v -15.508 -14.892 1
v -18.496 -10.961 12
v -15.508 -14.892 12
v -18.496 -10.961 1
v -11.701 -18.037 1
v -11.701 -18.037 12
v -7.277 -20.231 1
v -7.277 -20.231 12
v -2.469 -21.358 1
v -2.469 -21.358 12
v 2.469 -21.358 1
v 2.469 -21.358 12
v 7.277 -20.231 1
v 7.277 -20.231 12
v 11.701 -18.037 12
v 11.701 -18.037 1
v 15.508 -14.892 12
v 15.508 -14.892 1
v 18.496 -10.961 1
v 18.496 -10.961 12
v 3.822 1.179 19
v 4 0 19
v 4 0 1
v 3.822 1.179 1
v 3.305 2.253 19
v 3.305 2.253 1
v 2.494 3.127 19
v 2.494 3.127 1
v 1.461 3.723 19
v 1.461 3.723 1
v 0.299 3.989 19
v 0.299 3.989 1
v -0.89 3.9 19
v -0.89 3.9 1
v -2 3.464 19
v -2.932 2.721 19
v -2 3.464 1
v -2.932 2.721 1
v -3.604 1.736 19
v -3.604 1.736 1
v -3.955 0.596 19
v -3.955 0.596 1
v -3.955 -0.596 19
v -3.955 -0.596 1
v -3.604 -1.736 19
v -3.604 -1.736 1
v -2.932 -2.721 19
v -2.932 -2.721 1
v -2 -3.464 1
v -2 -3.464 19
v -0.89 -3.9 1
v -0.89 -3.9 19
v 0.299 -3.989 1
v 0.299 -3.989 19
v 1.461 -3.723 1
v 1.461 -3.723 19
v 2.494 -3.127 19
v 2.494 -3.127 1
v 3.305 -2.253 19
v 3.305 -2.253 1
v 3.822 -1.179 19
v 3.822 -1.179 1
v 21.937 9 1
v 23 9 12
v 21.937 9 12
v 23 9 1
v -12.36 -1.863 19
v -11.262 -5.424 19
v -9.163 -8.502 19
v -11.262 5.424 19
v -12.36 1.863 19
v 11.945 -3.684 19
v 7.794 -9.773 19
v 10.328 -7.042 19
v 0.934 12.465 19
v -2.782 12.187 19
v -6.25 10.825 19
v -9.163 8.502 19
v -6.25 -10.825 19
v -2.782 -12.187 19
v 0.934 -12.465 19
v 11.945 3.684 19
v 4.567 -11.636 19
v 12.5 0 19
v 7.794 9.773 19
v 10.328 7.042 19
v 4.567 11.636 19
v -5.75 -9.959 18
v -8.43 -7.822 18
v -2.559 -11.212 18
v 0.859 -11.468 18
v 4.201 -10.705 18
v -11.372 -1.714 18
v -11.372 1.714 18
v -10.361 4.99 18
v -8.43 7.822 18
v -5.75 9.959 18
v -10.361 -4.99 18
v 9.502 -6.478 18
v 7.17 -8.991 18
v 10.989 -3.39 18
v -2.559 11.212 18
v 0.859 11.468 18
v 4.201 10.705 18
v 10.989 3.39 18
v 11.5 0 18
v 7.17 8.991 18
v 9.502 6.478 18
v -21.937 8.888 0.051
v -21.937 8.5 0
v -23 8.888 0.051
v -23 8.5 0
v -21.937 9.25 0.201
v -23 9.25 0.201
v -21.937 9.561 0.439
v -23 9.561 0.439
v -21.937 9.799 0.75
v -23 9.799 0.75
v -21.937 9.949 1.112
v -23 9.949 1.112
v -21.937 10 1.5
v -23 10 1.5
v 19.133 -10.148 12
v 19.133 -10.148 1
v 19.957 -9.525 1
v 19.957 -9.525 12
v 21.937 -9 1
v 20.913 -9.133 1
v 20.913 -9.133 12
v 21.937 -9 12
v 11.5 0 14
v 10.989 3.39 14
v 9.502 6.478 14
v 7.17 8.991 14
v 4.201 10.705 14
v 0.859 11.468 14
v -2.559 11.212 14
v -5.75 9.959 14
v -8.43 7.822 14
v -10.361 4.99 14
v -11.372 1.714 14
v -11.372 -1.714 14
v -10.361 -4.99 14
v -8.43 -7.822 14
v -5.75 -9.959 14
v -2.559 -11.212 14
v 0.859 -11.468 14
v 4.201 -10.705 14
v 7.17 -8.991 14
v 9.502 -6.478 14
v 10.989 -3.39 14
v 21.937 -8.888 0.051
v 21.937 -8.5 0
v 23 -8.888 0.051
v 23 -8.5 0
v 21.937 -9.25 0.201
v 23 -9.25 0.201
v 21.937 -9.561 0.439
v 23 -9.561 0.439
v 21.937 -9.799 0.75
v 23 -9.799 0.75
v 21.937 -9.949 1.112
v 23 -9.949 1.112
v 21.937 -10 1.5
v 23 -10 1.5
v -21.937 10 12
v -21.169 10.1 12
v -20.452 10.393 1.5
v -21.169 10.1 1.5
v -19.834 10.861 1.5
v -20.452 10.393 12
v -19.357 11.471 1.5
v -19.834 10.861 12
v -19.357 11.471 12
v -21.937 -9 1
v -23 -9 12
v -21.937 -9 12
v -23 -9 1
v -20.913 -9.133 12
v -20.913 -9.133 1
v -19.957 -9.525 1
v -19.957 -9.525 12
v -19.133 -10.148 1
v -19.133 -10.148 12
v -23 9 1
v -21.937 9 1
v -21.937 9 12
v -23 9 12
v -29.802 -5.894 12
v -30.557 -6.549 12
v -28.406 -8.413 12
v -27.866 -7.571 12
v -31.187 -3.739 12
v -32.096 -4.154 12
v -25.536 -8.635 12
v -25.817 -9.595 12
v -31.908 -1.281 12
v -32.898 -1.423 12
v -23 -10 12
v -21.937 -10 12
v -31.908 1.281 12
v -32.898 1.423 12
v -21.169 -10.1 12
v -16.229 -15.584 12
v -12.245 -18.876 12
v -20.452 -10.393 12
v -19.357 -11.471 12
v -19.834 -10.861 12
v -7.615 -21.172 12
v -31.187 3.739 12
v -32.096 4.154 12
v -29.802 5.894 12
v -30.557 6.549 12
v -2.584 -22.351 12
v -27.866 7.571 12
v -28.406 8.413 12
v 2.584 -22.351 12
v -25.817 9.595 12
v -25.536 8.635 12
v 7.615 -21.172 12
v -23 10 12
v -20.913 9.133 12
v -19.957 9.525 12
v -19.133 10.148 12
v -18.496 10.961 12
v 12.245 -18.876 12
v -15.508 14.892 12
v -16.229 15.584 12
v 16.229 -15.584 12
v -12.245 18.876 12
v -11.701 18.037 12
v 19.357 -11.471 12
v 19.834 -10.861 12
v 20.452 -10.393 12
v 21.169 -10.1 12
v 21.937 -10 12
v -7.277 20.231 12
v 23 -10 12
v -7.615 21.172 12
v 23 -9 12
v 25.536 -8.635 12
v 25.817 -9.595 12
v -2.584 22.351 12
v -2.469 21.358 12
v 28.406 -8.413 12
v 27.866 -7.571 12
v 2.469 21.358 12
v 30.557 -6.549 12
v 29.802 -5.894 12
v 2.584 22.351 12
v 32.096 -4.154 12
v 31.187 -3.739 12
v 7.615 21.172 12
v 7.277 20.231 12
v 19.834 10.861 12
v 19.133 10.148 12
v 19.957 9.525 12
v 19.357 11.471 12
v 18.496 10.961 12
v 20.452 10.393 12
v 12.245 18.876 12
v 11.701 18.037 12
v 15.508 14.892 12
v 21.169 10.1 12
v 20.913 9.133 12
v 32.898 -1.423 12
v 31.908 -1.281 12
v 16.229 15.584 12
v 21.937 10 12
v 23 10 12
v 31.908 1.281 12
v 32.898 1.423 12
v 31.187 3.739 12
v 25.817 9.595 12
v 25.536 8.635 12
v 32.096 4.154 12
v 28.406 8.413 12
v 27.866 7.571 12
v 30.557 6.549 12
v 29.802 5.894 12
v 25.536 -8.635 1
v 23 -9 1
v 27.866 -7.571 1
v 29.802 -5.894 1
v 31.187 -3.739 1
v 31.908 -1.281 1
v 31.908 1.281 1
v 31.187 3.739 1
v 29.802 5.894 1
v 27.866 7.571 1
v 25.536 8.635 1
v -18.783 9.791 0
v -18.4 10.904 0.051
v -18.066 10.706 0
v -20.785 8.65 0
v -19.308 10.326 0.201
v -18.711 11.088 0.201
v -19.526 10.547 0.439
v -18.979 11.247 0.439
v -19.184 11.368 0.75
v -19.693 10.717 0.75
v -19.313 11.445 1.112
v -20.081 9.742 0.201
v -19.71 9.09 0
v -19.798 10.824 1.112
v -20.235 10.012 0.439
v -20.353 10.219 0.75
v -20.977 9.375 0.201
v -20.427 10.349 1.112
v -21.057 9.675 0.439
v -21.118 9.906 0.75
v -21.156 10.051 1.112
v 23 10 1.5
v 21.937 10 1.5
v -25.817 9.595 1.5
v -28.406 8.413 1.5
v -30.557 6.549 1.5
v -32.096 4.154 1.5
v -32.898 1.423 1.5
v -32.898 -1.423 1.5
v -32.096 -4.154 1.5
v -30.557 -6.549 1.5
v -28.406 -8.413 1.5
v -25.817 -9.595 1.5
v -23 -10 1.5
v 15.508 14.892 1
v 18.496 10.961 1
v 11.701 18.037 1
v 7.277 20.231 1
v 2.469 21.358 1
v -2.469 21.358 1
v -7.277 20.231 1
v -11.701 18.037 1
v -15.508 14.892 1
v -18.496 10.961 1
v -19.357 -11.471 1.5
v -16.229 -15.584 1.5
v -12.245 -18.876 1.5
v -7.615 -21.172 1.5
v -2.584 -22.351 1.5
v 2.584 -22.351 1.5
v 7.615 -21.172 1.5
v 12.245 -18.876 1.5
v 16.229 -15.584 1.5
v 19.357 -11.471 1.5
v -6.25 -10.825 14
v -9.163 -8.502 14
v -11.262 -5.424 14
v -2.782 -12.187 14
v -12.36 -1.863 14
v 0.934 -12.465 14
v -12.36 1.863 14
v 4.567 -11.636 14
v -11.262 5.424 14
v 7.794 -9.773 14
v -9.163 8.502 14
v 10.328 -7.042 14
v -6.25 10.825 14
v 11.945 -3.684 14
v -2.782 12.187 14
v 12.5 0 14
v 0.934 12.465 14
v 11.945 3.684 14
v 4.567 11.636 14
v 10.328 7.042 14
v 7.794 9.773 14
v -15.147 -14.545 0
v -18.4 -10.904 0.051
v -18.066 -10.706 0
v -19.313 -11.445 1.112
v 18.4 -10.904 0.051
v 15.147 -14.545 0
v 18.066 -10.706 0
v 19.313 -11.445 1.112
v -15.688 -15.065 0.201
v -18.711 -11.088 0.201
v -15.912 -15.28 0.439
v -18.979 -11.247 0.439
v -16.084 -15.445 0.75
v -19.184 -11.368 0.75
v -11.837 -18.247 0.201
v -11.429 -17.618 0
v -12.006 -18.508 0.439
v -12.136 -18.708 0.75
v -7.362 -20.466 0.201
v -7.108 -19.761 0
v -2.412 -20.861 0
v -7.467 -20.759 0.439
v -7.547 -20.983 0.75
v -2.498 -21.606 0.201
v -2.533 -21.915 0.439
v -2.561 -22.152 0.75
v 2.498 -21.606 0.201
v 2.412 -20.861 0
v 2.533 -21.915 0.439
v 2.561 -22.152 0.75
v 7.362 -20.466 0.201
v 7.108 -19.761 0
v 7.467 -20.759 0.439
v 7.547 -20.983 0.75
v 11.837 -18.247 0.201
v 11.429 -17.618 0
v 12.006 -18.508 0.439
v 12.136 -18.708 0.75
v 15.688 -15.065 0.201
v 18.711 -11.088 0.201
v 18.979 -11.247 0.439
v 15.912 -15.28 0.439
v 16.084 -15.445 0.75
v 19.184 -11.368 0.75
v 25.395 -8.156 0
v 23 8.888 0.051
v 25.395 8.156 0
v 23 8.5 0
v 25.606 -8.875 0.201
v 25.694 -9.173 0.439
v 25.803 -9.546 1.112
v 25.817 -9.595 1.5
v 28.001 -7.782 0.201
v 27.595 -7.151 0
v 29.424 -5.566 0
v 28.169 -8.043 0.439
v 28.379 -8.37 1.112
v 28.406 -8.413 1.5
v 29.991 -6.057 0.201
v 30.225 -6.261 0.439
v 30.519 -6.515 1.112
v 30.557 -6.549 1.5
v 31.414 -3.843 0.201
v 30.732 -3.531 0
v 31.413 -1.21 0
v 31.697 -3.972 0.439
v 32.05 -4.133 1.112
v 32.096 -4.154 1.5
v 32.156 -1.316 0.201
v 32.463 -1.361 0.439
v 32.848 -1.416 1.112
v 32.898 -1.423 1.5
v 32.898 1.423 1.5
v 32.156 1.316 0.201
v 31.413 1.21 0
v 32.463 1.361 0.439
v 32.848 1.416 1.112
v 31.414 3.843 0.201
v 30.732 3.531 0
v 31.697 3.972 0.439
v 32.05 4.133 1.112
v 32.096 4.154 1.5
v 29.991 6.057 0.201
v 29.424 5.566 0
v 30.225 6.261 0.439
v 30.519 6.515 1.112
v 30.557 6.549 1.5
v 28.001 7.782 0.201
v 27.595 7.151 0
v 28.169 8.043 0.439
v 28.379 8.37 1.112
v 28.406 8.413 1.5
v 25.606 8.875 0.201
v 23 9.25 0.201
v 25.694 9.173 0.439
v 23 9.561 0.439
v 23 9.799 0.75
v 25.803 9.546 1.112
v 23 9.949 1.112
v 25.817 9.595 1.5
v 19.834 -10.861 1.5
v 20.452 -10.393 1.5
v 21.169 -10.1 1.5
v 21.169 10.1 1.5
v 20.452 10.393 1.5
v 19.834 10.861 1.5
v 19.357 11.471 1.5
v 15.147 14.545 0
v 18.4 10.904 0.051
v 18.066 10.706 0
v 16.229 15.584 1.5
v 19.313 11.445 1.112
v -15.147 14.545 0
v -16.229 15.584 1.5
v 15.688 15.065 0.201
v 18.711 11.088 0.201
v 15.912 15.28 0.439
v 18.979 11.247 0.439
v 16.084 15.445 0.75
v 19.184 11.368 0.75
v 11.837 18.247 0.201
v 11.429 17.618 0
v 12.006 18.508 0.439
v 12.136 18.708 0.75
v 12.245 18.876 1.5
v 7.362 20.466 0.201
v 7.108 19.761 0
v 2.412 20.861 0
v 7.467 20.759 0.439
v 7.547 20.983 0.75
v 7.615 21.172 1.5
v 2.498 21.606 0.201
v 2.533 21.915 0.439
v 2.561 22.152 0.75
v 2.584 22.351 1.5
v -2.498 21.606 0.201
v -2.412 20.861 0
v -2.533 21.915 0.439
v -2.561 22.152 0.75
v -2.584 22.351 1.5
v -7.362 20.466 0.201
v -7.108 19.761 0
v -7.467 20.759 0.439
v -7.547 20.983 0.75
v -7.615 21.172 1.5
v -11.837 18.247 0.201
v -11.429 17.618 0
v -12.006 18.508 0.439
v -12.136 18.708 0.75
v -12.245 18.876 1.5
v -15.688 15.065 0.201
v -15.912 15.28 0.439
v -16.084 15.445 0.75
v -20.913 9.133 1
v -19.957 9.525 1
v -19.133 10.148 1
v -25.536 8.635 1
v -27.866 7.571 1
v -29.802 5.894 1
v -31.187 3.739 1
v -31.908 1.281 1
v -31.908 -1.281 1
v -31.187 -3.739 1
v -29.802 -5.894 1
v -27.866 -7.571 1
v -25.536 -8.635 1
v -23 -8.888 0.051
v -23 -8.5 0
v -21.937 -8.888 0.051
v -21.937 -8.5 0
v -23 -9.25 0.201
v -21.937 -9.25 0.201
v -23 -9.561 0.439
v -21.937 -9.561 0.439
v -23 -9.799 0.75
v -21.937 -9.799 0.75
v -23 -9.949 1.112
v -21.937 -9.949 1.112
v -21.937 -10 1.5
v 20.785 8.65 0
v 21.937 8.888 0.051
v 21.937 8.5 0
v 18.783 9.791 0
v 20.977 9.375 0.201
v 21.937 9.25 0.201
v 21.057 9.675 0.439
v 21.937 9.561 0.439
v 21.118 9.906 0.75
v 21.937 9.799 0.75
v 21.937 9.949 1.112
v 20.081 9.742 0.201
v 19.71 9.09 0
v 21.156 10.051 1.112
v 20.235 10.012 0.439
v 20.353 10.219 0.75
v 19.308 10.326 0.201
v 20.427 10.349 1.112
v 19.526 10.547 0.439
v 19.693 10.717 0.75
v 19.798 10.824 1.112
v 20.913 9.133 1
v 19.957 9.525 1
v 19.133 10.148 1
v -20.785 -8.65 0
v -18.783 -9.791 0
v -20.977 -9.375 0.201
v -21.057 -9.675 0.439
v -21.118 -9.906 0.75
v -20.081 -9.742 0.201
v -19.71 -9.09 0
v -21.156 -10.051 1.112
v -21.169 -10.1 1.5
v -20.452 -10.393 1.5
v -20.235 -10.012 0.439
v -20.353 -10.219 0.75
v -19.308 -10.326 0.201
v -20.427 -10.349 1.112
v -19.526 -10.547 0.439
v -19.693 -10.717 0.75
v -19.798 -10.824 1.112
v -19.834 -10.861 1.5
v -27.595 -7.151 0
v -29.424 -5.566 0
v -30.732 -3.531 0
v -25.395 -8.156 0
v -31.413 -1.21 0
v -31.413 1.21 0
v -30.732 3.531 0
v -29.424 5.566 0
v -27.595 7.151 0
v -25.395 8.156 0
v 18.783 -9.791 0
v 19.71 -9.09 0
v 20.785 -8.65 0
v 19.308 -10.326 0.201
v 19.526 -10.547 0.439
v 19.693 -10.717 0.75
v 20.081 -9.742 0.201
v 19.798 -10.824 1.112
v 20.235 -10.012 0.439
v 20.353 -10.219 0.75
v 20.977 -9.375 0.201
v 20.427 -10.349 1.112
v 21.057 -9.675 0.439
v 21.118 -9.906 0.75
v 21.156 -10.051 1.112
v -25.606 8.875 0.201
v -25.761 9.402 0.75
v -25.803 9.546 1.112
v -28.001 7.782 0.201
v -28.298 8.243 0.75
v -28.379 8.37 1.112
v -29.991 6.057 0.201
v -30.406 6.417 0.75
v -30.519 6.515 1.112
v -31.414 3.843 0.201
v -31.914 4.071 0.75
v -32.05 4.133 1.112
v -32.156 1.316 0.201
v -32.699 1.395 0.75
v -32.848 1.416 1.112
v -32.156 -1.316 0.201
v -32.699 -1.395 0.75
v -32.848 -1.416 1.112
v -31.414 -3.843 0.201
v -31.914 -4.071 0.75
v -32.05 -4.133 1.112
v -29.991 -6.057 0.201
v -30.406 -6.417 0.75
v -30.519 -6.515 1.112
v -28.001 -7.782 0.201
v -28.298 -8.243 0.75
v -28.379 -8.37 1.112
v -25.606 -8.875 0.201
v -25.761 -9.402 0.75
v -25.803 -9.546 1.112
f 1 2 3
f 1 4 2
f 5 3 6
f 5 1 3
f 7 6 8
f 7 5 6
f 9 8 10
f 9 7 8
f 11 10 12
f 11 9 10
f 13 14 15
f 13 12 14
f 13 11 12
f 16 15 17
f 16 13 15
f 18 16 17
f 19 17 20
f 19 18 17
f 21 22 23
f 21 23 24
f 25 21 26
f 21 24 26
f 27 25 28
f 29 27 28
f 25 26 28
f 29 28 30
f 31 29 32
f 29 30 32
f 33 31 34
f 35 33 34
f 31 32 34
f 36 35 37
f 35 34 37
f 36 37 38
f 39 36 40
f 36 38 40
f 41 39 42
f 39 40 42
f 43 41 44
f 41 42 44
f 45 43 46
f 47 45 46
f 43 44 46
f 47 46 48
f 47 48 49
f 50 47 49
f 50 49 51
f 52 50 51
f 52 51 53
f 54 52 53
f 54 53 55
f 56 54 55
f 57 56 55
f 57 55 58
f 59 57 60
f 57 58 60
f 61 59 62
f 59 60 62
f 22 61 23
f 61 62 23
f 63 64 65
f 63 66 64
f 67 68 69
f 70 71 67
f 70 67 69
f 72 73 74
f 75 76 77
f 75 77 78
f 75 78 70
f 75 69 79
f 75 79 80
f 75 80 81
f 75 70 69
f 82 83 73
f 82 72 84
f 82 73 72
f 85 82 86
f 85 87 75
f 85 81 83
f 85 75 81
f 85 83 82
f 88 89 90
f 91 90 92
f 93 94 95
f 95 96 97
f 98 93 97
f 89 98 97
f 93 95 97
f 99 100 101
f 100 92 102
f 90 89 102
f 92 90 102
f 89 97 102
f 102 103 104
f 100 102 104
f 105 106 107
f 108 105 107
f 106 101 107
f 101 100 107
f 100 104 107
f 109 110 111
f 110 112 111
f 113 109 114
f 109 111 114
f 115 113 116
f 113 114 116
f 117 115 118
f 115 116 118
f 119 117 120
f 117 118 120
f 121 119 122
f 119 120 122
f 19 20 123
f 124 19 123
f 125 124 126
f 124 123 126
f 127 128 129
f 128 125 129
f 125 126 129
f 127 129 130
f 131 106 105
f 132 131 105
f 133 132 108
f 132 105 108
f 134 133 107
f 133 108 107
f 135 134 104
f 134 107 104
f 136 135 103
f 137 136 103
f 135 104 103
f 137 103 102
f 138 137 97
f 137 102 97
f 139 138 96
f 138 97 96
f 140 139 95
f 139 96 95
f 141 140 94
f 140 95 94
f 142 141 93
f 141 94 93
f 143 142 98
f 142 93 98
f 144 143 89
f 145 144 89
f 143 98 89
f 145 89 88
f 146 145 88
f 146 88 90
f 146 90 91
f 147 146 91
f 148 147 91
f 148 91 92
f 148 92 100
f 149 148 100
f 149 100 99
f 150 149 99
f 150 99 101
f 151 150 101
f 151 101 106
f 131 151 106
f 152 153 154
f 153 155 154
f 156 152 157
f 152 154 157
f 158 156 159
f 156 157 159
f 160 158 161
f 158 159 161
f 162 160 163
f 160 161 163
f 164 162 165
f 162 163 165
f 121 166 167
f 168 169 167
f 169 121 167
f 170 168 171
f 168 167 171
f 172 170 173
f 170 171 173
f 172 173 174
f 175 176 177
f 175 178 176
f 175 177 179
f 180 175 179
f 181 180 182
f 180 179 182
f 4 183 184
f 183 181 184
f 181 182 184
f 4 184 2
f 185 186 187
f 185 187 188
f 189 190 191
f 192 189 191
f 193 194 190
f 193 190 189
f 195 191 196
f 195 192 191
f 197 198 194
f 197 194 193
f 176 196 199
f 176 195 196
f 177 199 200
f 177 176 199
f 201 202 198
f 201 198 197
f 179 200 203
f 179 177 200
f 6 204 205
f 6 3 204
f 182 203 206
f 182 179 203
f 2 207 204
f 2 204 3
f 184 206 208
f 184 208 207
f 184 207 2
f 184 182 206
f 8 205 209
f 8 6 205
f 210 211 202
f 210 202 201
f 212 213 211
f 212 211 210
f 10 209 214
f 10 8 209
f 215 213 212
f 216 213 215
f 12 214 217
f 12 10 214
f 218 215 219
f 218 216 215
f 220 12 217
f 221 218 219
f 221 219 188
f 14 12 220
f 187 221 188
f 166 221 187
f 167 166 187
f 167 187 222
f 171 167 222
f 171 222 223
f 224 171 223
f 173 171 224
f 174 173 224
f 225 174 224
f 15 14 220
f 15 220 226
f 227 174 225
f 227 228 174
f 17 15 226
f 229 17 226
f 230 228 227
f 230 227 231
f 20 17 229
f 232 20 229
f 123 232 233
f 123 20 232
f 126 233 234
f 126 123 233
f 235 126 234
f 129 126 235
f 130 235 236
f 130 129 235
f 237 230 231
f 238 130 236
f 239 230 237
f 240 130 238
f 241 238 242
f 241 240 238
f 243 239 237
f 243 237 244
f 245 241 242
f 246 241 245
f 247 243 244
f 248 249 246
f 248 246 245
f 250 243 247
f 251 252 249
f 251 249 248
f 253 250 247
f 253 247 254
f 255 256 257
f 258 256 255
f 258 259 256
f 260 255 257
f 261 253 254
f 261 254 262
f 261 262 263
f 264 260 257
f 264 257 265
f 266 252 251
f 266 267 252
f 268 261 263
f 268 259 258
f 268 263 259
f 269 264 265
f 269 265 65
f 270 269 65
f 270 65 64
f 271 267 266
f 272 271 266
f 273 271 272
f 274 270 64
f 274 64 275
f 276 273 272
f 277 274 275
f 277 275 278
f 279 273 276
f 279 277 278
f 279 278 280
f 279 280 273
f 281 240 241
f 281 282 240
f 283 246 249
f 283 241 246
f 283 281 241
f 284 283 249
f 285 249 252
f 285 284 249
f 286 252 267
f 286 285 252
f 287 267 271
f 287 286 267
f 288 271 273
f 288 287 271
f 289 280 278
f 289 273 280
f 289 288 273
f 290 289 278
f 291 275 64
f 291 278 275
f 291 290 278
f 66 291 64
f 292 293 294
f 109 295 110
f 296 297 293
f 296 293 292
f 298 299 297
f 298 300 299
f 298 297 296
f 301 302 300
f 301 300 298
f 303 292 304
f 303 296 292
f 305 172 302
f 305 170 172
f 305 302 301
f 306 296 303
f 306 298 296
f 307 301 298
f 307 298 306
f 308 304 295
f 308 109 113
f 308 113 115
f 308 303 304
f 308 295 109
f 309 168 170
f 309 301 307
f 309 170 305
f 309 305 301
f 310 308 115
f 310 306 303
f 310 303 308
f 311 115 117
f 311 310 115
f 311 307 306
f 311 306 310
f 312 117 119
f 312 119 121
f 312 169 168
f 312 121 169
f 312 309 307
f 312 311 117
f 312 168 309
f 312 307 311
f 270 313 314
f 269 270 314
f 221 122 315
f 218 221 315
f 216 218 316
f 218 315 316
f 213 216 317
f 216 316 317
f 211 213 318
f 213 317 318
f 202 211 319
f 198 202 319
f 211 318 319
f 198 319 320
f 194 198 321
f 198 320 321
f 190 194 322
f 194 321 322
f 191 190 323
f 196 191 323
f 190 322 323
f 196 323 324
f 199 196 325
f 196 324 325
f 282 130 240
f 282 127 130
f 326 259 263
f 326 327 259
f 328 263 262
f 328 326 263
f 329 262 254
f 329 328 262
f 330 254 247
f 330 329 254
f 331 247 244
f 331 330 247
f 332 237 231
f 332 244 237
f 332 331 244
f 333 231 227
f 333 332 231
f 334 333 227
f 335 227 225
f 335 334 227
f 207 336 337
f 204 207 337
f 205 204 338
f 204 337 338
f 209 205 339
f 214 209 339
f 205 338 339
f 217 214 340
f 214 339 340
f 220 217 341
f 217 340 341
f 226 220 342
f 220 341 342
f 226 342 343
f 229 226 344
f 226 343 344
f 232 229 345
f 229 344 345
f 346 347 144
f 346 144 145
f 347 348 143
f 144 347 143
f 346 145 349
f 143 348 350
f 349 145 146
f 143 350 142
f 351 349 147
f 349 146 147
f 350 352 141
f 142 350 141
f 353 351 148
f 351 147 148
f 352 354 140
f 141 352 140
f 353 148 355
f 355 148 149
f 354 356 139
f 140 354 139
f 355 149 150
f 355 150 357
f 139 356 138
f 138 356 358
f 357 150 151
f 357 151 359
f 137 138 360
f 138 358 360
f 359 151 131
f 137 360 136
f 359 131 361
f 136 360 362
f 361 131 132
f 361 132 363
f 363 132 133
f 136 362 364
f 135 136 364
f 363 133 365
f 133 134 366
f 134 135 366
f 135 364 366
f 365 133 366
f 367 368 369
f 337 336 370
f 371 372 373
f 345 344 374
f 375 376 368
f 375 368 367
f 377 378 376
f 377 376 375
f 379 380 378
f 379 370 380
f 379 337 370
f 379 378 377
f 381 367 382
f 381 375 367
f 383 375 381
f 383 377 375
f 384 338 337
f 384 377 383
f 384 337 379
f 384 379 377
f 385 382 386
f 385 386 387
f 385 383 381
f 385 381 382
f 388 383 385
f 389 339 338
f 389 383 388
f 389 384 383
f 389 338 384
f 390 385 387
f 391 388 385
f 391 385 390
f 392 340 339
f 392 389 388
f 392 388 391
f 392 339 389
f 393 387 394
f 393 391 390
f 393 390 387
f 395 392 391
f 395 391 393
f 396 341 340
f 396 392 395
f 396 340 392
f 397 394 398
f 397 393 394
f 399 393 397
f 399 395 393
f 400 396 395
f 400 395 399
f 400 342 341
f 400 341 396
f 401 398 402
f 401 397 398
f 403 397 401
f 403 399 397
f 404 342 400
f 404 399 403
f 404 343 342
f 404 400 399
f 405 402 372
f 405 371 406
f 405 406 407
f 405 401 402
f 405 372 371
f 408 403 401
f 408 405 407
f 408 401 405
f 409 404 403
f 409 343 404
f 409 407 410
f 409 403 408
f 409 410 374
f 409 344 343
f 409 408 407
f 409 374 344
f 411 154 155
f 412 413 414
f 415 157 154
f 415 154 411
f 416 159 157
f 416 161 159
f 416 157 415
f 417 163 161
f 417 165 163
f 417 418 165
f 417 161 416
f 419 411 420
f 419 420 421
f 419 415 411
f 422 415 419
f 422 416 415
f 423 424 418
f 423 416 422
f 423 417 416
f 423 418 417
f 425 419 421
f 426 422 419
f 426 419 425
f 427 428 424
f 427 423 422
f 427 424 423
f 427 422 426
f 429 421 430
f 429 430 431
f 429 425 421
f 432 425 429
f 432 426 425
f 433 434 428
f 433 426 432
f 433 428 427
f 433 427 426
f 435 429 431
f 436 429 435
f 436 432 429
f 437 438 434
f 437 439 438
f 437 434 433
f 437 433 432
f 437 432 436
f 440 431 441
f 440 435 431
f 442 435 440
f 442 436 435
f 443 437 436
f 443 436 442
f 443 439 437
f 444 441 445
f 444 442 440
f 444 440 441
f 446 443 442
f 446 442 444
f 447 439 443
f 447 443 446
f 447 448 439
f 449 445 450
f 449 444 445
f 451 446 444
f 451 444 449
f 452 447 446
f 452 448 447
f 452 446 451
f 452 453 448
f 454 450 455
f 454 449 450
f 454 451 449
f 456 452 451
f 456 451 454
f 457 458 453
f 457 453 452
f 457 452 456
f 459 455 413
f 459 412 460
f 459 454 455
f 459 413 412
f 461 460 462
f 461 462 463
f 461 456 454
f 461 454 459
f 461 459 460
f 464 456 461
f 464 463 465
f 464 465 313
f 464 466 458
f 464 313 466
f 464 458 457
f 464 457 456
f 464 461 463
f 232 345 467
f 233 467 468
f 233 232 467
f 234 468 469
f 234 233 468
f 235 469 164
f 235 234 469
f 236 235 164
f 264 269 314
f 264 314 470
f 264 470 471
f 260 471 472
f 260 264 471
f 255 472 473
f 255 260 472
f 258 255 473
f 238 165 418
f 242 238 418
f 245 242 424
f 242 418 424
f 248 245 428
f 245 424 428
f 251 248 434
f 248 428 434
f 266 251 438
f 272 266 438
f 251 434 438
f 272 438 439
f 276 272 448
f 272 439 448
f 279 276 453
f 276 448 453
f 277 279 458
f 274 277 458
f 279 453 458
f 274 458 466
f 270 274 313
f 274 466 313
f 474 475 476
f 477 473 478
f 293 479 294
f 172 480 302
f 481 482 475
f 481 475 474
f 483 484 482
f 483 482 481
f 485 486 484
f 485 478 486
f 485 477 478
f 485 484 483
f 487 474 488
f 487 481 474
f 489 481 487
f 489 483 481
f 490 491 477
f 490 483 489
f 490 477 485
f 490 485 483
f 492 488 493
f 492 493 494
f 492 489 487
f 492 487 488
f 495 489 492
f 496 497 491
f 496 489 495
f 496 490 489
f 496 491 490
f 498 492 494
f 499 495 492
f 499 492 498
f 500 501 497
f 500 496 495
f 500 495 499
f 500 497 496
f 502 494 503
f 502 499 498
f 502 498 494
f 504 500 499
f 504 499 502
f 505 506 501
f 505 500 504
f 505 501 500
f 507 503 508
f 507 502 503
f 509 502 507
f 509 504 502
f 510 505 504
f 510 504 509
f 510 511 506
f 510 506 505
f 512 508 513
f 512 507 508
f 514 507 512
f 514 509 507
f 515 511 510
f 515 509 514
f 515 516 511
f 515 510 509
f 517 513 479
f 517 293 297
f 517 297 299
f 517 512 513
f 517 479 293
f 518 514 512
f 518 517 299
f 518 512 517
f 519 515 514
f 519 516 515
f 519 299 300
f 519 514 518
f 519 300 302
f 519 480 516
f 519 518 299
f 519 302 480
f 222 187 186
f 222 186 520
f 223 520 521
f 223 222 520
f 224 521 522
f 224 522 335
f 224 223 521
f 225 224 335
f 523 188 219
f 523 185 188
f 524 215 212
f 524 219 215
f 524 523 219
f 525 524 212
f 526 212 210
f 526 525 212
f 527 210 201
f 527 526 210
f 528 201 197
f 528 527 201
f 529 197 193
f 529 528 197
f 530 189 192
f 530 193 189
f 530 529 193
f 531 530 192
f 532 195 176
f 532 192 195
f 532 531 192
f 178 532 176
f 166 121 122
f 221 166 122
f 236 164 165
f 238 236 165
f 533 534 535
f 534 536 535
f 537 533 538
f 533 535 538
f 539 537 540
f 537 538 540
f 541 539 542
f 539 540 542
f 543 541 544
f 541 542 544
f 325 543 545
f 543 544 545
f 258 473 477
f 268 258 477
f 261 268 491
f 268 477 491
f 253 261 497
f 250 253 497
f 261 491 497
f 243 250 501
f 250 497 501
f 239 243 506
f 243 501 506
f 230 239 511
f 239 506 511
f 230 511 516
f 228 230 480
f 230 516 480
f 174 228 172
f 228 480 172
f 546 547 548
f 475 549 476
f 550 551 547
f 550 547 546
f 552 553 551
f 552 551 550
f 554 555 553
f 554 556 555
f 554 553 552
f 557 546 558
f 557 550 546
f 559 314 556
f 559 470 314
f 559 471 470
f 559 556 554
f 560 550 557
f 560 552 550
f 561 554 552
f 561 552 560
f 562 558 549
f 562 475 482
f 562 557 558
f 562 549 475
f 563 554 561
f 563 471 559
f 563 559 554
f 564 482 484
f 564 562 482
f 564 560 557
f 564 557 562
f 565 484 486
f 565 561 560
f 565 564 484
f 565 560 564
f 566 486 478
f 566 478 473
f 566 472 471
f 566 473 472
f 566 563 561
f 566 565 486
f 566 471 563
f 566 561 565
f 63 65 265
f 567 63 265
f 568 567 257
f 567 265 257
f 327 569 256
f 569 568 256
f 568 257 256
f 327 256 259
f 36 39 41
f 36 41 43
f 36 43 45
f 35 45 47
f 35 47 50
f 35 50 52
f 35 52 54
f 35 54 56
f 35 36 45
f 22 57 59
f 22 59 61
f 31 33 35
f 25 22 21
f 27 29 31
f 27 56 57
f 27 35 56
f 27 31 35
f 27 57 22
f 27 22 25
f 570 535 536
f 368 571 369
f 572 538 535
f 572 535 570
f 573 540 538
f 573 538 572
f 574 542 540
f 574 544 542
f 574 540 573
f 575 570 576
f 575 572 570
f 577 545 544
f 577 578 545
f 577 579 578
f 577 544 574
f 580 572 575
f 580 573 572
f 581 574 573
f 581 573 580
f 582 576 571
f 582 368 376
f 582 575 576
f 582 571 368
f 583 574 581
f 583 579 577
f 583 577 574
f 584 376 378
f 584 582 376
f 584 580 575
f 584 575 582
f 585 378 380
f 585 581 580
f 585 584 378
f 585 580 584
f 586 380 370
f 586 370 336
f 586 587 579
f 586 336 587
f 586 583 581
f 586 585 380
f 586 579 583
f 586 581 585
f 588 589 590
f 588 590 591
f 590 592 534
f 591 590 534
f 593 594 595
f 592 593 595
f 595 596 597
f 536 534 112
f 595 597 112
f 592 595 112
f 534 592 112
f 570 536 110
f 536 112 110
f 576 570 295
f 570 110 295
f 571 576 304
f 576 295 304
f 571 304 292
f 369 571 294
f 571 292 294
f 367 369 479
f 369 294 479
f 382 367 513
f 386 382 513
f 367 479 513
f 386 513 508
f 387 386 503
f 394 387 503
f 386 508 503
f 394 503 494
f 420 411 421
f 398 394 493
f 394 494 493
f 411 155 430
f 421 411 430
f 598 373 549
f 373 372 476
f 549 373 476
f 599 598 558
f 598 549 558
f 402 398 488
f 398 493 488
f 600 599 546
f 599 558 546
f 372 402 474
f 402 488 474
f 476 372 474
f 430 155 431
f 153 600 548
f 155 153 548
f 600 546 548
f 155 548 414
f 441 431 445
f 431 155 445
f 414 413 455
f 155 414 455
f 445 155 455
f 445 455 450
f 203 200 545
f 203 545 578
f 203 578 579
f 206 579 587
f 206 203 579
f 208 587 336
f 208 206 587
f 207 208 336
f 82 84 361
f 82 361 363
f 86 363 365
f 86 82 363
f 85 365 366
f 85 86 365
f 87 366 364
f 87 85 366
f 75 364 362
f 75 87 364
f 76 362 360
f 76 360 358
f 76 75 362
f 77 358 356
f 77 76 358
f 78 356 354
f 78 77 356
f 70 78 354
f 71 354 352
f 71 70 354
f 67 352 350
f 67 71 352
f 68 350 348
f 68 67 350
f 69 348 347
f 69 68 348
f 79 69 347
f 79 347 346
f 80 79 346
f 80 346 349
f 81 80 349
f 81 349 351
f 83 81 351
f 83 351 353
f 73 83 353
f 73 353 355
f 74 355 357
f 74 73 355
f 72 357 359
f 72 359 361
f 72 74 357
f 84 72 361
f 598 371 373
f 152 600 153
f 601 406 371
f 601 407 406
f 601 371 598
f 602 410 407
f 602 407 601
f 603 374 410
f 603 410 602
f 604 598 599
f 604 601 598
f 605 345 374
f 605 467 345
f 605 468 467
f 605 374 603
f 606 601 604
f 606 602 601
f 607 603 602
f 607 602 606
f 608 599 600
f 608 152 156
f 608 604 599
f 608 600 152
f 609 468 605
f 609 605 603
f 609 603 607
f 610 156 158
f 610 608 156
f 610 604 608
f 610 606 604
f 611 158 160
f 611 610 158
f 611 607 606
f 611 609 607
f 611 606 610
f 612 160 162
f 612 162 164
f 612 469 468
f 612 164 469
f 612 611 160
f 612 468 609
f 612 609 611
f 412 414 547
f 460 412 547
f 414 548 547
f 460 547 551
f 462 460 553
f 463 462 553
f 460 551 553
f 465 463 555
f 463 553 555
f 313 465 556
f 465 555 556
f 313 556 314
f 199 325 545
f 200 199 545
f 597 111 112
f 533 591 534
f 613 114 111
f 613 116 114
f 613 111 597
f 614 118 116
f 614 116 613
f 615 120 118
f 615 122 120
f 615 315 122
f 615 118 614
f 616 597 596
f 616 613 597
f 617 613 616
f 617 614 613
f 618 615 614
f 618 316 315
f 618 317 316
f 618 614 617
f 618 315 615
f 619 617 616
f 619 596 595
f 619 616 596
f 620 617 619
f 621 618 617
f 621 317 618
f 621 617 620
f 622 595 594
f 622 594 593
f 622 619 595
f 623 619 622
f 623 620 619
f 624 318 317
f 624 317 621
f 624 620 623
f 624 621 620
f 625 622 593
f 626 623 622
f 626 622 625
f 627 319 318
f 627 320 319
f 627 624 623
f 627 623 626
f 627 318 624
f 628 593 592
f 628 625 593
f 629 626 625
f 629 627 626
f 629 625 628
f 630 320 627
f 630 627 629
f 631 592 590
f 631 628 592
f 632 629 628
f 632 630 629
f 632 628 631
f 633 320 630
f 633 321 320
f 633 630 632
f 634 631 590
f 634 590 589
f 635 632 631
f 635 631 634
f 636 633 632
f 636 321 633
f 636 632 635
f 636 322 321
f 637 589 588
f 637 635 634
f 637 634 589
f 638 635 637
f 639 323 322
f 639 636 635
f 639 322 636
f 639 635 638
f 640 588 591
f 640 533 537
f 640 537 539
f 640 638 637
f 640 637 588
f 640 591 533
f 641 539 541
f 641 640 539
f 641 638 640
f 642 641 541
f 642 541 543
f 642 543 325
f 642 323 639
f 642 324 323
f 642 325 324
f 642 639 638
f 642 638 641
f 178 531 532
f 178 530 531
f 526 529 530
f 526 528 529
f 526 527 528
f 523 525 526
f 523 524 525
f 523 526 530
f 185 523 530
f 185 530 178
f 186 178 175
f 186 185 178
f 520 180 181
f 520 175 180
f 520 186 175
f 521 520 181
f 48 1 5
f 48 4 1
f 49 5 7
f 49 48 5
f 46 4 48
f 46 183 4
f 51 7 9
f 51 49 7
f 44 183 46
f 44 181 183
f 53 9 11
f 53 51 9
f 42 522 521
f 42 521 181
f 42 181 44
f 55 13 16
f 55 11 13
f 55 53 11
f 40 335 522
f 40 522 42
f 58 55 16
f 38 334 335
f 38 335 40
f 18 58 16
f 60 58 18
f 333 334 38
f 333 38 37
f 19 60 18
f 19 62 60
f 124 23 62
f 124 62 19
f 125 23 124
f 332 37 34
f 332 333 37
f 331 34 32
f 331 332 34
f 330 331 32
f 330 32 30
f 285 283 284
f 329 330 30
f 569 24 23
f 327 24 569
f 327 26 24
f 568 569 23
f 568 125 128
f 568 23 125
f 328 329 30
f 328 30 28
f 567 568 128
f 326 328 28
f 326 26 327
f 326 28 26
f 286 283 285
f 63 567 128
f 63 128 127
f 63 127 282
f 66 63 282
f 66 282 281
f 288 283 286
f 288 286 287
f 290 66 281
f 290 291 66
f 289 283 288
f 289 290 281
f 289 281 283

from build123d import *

# Parameters (mm, degrees)
DODANIE_WYCI_GNI_CIE1_DEPTH = 12
ZAOKR_GLENIE1_R             = 3
SKORUPA1_T                  = -1
SZKIC2_R                    = 4
DODANIE_WYCI_GNI_CIE2_DEPTH = 18
SZKIC3_R                    = 12.5
DODANIE_WYCI_GNI_CIE3_DEPTH = 5
SKORUPA2_T                  = -1
ZAOKR_GLENIE2_R             = 1.5


with BuildPart() as part:
    # Szkic1 → Dodanie-wyciągnięcie1 (new body)
    with BuildSketch(Plane.XY):
        with BuildLine():
            Line((-20.155644371, 10), (-23, 10))
            ThreePointArc((-23, 10), (-33, 0), (-23, -10))
            Line((-23, -10), (-20.155644371, -10))
            ThreePointArc((-20.155644371, -10), (0, -22.5), (20.155644371, -10))
            Line((20.155644371, -10), (23, -10))
            ThreePointArc((23, -10), (33, 0), (23, 10))
            Line((23, 10), (20.155644371, 10))
            ThreePointArc((20.155644371, 10), (0, 22.5), (-20.155644371, 10))
        make_face()
    extrude(amount=DODANIE_WYCI_GNI_CIE1_DEPTH)

    # Zaokrąglenie1
    zaokr_glenie1_edges = [part.edges().sort_by_distance(p)[0] for p in [
        (20.155644371, 10, 6),
        (20.155644371, -10, 6),
        (-20.155644371, -10, 6),
        (-20.155644371, 10, 6),
    ]]
    fillet(zaokr_glenie1_edges, radius=ZAOKR_GLENIE1_R)

    # Skorupa1
    skorupa1_openings = [part.faces().sort_by_distance(p)[0] for p in [
        (0, 0, 12),
    ]]
    offset(amount=SKORUPA1_T, openings=skorupa1_openings, kind=Kind.INTERSECTION)

    # Szkic2 → Dodanie-wyciągnięcie2 (add)
    with BuildSketch(Plane.XY.offset(1)):
        Circle(SZKIC2_R)
    extrude(amount=DODANIE_WYCI_GNI_CIE2_DEPTH)

    # Zaokrąglenie2
    zaokr_glenie2_edges = [part.edges().sort_by_distance(p)[0] for p in [
        (-22.468705484, -10, 0),
        (-33, 0, 0),
        (0, -22.5, 0),
        (22.468705484, -10, 0),
        (0, 22.5, 0),
        (-22.468705484, 10, 0),
        (-20.452189654, -10.393447172, 0),
        (20.452189654, -10.393447172, 0),
        (20.452189654, 10.393447172, 0),
        (-20.452189654, 10.393447172, 0),
        (22.468705484, 10, 0),
        (33, 0, 0),
    ]]
    fillet(zaokr_glenie2_edges, radius=ZAOKR_GLENIE2_R)


with BuildPart() as body_2:
    # Szkic3 → Dodanie-wyciągnięcie3 (new body)
    with BuildSketch(Plane.XY.offset(19)):
        Circle(SZKIC3_R)
    extrude(amount=-DODANIE_WYCI_GNI_CIE3_DEPTH)

    # Skorupa2
    skorupa2_openings = [body_2.faces().sort_by_distance(p)[0] for p in [
        (0, 0, 14),
    ]]
    offset(amount=SKORUPA2_T, openings=skorupa2_openings, kind=Kind.INTERSECTION)


solid = Compound([part.part, body_2.part])
